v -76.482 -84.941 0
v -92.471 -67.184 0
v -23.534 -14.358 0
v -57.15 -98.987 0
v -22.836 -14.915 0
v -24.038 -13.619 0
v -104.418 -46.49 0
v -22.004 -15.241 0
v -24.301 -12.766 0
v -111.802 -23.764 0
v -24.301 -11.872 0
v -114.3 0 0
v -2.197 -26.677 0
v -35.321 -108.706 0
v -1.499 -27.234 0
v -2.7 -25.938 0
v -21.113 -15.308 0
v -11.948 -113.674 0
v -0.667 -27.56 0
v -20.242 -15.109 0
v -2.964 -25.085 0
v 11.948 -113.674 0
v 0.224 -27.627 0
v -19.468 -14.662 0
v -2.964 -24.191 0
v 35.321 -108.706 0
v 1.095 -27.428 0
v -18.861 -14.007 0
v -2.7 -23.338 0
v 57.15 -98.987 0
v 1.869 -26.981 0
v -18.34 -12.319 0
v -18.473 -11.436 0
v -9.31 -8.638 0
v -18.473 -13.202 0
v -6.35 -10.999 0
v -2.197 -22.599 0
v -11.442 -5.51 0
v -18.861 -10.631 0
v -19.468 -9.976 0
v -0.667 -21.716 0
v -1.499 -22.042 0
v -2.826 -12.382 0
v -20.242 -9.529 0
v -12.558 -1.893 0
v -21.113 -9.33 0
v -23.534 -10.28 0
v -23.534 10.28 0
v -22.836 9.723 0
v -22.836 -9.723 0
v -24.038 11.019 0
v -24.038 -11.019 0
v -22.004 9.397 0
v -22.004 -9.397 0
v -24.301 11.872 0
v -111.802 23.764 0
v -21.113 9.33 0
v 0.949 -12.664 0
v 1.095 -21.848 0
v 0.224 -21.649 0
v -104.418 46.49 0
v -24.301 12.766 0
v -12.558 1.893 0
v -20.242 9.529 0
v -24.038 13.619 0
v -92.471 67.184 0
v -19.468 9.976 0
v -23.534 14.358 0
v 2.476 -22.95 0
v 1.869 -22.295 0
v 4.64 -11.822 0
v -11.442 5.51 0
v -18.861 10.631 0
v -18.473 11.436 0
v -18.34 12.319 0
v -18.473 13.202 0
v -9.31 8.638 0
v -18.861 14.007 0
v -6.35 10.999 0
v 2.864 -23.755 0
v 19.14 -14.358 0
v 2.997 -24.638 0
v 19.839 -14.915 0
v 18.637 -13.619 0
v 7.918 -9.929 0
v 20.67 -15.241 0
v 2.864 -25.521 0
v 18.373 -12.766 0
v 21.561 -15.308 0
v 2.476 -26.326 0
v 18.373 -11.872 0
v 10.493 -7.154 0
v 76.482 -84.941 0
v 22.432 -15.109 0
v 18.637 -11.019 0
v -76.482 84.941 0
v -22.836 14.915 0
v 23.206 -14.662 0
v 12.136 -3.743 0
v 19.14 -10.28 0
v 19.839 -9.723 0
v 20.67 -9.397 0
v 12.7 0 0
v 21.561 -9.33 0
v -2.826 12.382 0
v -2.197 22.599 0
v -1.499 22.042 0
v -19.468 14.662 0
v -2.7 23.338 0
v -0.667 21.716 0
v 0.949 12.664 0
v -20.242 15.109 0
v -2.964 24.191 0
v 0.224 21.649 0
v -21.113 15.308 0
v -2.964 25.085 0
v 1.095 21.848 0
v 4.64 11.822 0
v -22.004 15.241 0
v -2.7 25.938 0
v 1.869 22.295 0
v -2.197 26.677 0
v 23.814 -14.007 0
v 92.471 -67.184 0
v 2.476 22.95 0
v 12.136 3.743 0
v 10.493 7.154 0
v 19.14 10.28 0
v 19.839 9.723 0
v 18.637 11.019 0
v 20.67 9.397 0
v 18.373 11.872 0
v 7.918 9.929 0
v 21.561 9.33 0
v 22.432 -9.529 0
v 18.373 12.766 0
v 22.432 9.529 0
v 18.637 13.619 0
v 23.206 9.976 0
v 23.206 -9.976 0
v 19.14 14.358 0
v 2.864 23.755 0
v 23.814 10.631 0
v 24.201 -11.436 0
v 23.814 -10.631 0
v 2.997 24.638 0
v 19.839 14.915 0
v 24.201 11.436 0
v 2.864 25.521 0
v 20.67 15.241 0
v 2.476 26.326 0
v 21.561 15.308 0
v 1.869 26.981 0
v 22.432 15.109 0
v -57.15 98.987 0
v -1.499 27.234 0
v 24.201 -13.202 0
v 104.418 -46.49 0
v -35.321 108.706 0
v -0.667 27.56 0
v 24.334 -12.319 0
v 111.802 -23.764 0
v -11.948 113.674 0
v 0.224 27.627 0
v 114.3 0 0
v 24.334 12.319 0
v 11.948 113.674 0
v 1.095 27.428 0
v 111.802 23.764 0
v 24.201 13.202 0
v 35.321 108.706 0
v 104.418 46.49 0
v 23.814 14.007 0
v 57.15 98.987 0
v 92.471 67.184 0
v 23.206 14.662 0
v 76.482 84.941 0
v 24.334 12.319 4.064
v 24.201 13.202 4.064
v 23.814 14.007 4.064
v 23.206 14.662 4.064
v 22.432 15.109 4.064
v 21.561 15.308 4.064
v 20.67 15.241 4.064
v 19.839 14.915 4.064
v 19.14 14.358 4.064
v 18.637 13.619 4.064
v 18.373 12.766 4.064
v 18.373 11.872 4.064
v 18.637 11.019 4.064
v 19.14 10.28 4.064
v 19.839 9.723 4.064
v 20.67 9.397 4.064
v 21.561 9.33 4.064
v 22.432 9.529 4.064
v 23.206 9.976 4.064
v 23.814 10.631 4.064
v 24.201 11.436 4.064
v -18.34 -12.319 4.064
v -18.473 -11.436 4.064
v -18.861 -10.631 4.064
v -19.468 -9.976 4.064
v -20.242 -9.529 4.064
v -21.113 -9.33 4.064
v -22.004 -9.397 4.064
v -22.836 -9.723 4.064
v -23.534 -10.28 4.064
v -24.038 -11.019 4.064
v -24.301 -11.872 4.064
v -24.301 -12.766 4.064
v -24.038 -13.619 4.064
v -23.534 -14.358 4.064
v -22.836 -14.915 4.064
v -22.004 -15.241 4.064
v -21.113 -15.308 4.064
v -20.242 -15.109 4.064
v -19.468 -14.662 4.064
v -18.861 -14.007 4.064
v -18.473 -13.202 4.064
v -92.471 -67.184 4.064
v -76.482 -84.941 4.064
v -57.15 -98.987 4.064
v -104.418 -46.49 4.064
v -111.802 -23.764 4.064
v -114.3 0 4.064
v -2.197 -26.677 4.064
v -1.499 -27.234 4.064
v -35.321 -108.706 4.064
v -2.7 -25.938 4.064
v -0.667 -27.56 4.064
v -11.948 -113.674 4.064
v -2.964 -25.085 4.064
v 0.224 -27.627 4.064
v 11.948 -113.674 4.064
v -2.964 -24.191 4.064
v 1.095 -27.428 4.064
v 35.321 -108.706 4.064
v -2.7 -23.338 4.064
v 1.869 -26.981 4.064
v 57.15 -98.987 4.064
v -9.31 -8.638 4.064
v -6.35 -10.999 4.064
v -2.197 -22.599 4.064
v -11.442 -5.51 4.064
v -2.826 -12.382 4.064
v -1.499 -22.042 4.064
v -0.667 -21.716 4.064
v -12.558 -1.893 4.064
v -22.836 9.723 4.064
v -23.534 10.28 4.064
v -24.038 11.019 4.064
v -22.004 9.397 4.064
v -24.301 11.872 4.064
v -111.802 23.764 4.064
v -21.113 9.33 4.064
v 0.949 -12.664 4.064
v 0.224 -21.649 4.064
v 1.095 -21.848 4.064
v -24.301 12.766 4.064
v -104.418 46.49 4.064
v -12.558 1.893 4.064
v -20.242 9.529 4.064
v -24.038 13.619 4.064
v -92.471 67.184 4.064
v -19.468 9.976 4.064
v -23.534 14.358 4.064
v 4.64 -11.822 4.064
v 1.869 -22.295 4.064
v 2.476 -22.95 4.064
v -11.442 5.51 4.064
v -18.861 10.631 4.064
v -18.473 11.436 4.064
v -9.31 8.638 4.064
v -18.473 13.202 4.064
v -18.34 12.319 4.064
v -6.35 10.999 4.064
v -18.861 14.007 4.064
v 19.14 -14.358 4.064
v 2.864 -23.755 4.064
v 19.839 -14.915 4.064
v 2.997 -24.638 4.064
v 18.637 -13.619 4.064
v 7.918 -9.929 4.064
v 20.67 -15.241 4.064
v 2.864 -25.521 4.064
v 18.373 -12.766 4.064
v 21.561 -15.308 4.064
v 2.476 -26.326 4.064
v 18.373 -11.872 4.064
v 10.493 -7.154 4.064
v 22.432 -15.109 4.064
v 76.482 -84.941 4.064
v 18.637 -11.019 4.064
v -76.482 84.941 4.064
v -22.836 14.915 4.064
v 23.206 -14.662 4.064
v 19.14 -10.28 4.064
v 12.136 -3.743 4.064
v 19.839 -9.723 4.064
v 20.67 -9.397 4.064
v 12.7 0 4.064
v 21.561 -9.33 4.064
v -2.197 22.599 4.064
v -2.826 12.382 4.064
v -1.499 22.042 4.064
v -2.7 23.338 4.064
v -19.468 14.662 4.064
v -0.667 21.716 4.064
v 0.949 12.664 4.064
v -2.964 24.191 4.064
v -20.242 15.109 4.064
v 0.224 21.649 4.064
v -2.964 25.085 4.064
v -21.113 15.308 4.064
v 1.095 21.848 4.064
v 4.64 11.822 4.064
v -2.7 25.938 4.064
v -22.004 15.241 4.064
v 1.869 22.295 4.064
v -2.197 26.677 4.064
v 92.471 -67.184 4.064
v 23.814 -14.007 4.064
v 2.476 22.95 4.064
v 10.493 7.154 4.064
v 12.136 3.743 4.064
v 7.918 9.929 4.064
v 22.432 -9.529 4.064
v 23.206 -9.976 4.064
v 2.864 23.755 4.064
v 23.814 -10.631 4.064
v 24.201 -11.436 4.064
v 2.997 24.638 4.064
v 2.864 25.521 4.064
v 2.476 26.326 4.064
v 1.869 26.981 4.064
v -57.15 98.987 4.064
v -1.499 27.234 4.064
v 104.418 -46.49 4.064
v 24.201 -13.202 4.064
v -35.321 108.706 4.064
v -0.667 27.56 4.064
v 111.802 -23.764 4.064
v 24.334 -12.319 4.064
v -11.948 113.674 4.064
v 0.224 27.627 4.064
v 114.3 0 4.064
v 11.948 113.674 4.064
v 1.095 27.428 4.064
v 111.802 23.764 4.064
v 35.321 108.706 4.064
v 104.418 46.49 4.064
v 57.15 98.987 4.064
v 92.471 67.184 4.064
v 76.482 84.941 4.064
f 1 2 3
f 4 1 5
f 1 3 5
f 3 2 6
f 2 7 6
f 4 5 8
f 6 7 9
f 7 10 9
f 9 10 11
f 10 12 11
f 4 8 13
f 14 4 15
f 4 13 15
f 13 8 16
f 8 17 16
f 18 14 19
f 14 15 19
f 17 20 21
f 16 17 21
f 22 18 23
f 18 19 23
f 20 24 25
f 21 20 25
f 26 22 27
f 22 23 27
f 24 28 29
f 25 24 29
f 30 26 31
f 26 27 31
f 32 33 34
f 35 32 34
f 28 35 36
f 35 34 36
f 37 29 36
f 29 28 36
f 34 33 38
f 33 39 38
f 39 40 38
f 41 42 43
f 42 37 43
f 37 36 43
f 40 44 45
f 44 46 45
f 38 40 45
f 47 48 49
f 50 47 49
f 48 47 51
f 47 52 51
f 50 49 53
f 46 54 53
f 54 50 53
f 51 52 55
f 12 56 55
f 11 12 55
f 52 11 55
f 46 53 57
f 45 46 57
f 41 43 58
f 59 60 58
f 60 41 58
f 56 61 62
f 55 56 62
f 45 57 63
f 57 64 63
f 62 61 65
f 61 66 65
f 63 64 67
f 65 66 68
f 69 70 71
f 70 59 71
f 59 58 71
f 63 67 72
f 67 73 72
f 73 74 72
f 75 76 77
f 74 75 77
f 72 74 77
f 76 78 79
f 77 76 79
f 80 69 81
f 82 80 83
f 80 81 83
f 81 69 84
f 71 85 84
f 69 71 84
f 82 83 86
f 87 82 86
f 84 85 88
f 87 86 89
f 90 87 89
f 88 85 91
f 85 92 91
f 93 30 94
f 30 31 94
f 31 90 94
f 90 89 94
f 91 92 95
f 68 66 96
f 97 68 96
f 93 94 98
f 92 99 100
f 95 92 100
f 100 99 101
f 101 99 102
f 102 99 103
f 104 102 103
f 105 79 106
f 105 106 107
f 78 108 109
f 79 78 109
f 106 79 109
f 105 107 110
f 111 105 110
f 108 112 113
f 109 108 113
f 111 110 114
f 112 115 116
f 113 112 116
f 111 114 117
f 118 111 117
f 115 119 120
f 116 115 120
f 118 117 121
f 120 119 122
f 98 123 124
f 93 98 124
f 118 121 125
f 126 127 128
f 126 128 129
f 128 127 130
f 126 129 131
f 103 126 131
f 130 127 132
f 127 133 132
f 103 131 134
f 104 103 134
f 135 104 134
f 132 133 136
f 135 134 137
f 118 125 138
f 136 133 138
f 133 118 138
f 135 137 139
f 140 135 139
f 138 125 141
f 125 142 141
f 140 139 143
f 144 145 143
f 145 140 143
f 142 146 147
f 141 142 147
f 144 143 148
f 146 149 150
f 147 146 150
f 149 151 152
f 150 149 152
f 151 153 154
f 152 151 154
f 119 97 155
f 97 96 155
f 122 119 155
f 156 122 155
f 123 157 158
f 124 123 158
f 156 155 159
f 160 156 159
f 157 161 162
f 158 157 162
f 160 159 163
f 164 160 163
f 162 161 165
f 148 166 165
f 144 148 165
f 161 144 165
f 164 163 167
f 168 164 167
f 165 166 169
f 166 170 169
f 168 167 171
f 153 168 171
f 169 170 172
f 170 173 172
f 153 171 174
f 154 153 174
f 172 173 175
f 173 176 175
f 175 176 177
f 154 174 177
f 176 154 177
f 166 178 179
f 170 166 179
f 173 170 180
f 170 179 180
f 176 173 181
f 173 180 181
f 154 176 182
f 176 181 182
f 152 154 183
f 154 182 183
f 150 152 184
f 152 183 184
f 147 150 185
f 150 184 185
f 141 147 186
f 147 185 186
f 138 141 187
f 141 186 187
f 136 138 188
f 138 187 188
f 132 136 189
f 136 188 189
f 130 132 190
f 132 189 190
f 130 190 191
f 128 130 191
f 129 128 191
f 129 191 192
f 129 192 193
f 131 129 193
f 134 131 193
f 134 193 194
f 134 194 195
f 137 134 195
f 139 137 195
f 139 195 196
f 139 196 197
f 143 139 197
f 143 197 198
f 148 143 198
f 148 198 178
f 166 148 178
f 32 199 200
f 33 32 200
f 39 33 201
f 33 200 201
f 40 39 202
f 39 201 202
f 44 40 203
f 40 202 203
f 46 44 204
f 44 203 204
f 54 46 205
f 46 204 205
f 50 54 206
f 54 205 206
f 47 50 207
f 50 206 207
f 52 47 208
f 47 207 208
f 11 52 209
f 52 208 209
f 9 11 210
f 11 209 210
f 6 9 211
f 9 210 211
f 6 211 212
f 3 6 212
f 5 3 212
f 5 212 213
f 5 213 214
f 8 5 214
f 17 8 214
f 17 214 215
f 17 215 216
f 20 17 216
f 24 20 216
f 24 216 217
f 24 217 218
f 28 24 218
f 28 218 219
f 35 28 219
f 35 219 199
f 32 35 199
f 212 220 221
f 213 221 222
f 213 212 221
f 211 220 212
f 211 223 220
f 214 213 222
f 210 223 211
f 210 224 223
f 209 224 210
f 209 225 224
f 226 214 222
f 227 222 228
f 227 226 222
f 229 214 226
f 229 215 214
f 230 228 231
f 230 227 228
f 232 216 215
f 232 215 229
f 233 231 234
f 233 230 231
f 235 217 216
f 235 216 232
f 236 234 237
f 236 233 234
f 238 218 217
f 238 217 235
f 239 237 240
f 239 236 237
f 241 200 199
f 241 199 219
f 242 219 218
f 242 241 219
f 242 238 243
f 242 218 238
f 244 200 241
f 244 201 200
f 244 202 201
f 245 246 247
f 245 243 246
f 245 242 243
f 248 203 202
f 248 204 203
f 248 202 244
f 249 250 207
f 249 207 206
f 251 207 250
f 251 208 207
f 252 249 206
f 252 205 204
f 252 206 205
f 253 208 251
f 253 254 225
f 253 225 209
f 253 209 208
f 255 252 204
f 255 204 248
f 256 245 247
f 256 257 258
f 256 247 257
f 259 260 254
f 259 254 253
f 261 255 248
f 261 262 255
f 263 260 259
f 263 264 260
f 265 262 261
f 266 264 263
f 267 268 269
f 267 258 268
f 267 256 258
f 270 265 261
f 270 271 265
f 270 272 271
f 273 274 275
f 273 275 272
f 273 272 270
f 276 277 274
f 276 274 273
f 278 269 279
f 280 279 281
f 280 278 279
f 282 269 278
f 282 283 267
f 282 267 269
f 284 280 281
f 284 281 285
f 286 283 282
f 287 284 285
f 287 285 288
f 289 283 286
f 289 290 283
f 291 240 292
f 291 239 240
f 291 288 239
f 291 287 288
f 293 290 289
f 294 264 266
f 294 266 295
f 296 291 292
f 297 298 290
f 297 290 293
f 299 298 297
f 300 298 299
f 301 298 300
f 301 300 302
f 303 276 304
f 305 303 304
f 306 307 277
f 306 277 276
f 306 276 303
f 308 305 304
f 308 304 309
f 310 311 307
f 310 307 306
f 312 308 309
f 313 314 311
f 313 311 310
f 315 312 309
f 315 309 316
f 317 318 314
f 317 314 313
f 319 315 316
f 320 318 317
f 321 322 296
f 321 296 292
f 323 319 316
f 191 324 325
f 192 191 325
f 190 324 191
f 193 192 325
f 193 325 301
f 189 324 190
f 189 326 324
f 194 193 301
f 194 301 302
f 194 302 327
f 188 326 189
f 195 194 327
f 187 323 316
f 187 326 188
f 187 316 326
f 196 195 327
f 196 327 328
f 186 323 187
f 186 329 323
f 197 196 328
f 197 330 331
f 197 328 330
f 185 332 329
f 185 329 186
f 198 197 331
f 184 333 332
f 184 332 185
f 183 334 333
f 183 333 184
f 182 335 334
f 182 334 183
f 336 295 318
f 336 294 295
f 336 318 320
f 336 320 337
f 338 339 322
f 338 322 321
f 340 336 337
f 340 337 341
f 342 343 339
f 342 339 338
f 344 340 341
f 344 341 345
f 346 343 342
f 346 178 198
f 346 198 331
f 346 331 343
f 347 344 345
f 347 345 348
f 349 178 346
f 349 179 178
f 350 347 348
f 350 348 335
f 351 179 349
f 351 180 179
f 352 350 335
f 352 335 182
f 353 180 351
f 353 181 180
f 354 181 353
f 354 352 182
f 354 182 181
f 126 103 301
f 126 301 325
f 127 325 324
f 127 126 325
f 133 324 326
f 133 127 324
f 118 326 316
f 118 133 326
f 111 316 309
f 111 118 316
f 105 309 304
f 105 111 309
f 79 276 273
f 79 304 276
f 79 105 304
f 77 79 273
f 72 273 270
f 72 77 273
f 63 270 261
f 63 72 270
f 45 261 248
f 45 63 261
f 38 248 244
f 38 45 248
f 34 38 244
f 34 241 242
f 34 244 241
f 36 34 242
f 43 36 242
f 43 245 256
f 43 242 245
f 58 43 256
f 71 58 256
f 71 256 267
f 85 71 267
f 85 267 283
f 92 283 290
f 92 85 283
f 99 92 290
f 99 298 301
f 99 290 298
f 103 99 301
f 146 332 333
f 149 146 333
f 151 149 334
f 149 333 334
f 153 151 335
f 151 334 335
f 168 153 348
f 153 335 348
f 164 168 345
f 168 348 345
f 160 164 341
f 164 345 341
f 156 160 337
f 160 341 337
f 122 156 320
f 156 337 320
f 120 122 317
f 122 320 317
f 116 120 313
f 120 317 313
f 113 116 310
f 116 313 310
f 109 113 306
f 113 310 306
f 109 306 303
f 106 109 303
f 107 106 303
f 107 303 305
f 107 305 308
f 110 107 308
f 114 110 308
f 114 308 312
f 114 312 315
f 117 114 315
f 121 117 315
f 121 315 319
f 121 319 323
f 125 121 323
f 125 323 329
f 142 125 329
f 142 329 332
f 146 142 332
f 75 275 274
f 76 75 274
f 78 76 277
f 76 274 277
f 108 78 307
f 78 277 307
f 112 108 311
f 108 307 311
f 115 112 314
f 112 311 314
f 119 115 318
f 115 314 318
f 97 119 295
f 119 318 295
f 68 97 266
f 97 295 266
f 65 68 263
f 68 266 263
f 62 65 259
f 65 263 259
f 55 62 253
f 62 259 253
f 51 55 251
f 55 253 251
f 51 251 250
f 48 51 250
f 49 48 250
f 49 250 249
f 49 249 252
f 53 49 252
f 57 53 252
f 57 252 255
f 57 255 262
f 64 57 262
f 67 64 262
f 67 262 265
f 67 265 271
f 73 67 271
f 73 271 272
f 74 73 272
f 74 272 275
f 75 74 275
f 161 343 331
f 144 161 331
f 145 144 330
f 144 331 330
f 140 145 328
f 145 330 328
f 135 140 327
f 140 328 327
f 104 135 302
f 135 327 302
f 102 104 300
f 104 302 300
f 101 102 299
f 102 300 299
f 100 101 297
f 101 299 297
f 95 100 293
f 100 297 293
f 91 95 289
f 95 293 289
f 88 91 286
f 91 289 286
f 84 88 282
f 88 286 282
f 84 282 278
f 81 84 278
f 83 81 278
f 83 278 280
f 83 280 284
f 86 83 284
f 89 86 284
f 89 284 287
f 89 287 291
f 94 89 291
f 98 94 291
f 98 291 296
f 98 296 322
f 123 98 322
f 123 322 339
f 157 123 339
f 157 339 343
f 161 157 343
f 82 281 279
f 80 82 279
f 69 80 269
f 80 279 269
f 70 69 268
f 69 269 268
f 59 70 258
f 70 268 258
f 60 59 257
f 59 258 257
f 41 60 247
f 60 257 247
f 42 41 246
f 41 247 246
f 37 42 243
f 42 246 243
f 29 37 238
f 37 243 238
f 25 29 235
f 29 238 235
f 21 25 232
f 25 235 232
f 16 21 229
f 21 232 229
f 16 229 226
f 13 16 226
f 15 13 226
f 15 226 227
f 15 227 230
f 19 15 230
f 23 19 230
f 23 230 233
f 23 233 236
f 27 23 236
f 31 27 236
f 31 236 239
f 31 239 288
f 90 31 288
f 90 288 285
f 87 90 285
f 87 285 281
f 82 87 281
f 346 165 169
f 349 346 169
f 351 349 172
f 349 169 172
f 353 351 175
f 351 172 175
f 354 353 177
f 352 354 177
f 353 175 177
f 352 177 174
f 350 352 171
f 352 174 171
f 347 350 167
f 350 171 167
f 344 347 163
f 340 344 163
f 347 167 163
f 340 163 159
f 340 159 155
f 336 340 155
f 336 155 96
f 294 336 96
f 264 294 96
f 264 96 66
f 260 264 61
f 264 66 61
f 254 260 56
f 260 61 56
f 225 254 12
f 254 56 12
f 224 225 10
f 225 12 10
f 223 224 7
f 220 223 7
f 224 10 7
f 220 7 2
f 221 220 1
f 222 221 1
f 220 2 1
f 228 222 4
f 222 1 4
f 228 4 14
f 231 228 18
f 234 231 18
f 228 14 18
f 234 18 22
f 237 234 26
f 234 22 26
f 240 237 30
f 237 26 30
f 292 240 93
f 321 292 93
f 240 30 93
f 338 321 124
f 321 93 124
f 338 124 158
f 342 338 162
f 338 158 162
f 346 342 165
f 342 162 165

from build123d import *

# Parameters (mm, degrees)
SKETCH1_R               = 114.3
BOSS_EXTRUDE2_DEPTH     = 4.064
CUT_EXTRUDE1_DEPTH      = 70.612
CUT_EXTRUDE1_DEPTH_BACK = 101.6
SKETCH3_R               = 12.7
SKETCH4_R               = 2.9972
CUT_EXTRUDE3_DEPTH      = 70.612


with BuildPart() as part:
    # Sketch1 → Boss-Extrude2 (new body)
    with BuildSketch(Plane.XY):
        Circle(SKETCH1_R)
    extrude(amount=BOSS_EXTRUDE2_DEPTH)

    # Sketch3 → Cut-Extrude1 (cut, two sides: drawn at the far end of the back side and taken through both)
    with BuildSketch(Plane.XY.offset(4.064).offset(-CUT_EXTRUDE1_DEPTH_BACK)):
        Circle(SKETCH3_R)
    extrude(amount=CUT_EXTRUDE1_DEPTH + CUT_EXTRUDE1_DEPTH_BACK, mode=Mode.SUBTRACT)

    # Sketch4 → Cut-Extrude3 (cut)
    with BuildSketch(Plane.XY.offset(4.064)):
        with Locations((0, -24.638)):
            Circle(SKETCH4_R)
        with Locations((-21.337133898, -12.319)):
            Circle(SKETCH4_R)
        with Locations((-21.337133898, 12.319)):
            Circle(SKETCH4_R)
        with Locations((0, 24.638)):
            Circle(SKETCH4_R)
        with Locations((21.337133898, 12.319)):
            Circle(SKETCH4_R)
        with Locations((21.337133898, -12.319)):
            Circle(SKETCH4_R)
    extrude(amount=-CUT_EXTRUDE3_DEPTH, mode=Mode.SUBTRACT)


solid = part.part
